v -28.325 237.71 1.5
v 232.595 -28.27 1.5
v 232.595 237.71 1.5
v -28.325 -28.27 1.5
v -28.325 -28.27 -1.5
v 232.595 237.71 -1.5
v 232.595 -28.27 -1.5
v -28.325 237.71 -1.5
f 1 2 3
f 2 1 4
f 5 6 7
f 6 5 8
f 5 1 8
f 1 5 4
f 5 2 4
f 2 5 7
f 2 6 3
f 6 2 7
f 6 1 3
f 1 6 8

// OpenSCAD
//difference() {
//  cube(size=[30, 40, 10], center=true);
//  translate([-1.5, -7, 0]) {
//    scale([0.5, 0.5, 1]) linear_extrude(10) import("EtnAmpersand.dxf");
//  }
//}

sirka = 59.3;
vyska = 80.6;
pocet_sirka = 3;
pocet_vyska = 2;

module single() {


  ps = 3.9;
  pv = 14.6;


  linear_extrude(height = 15) {
     difference() {
       offset(r = 5) {
        import("EtnAmpersand.dxf");
       }
       offset(r = 0) {
         import("EtnAmpersand.dxf");
       }
     }
   }
  color("red") translate([ps, pv, 0]) cube(size=[sirka, vyska, 3], center=true);
}



scale([1.1, 1.1, 1]) {
  for (e=[0:pocet_vyska]) {
    for (i=[0:pocet_sirka]) {
      translate([i * sirka, e * vyska, 0]) {
        single();
      }
    }
  }
}
